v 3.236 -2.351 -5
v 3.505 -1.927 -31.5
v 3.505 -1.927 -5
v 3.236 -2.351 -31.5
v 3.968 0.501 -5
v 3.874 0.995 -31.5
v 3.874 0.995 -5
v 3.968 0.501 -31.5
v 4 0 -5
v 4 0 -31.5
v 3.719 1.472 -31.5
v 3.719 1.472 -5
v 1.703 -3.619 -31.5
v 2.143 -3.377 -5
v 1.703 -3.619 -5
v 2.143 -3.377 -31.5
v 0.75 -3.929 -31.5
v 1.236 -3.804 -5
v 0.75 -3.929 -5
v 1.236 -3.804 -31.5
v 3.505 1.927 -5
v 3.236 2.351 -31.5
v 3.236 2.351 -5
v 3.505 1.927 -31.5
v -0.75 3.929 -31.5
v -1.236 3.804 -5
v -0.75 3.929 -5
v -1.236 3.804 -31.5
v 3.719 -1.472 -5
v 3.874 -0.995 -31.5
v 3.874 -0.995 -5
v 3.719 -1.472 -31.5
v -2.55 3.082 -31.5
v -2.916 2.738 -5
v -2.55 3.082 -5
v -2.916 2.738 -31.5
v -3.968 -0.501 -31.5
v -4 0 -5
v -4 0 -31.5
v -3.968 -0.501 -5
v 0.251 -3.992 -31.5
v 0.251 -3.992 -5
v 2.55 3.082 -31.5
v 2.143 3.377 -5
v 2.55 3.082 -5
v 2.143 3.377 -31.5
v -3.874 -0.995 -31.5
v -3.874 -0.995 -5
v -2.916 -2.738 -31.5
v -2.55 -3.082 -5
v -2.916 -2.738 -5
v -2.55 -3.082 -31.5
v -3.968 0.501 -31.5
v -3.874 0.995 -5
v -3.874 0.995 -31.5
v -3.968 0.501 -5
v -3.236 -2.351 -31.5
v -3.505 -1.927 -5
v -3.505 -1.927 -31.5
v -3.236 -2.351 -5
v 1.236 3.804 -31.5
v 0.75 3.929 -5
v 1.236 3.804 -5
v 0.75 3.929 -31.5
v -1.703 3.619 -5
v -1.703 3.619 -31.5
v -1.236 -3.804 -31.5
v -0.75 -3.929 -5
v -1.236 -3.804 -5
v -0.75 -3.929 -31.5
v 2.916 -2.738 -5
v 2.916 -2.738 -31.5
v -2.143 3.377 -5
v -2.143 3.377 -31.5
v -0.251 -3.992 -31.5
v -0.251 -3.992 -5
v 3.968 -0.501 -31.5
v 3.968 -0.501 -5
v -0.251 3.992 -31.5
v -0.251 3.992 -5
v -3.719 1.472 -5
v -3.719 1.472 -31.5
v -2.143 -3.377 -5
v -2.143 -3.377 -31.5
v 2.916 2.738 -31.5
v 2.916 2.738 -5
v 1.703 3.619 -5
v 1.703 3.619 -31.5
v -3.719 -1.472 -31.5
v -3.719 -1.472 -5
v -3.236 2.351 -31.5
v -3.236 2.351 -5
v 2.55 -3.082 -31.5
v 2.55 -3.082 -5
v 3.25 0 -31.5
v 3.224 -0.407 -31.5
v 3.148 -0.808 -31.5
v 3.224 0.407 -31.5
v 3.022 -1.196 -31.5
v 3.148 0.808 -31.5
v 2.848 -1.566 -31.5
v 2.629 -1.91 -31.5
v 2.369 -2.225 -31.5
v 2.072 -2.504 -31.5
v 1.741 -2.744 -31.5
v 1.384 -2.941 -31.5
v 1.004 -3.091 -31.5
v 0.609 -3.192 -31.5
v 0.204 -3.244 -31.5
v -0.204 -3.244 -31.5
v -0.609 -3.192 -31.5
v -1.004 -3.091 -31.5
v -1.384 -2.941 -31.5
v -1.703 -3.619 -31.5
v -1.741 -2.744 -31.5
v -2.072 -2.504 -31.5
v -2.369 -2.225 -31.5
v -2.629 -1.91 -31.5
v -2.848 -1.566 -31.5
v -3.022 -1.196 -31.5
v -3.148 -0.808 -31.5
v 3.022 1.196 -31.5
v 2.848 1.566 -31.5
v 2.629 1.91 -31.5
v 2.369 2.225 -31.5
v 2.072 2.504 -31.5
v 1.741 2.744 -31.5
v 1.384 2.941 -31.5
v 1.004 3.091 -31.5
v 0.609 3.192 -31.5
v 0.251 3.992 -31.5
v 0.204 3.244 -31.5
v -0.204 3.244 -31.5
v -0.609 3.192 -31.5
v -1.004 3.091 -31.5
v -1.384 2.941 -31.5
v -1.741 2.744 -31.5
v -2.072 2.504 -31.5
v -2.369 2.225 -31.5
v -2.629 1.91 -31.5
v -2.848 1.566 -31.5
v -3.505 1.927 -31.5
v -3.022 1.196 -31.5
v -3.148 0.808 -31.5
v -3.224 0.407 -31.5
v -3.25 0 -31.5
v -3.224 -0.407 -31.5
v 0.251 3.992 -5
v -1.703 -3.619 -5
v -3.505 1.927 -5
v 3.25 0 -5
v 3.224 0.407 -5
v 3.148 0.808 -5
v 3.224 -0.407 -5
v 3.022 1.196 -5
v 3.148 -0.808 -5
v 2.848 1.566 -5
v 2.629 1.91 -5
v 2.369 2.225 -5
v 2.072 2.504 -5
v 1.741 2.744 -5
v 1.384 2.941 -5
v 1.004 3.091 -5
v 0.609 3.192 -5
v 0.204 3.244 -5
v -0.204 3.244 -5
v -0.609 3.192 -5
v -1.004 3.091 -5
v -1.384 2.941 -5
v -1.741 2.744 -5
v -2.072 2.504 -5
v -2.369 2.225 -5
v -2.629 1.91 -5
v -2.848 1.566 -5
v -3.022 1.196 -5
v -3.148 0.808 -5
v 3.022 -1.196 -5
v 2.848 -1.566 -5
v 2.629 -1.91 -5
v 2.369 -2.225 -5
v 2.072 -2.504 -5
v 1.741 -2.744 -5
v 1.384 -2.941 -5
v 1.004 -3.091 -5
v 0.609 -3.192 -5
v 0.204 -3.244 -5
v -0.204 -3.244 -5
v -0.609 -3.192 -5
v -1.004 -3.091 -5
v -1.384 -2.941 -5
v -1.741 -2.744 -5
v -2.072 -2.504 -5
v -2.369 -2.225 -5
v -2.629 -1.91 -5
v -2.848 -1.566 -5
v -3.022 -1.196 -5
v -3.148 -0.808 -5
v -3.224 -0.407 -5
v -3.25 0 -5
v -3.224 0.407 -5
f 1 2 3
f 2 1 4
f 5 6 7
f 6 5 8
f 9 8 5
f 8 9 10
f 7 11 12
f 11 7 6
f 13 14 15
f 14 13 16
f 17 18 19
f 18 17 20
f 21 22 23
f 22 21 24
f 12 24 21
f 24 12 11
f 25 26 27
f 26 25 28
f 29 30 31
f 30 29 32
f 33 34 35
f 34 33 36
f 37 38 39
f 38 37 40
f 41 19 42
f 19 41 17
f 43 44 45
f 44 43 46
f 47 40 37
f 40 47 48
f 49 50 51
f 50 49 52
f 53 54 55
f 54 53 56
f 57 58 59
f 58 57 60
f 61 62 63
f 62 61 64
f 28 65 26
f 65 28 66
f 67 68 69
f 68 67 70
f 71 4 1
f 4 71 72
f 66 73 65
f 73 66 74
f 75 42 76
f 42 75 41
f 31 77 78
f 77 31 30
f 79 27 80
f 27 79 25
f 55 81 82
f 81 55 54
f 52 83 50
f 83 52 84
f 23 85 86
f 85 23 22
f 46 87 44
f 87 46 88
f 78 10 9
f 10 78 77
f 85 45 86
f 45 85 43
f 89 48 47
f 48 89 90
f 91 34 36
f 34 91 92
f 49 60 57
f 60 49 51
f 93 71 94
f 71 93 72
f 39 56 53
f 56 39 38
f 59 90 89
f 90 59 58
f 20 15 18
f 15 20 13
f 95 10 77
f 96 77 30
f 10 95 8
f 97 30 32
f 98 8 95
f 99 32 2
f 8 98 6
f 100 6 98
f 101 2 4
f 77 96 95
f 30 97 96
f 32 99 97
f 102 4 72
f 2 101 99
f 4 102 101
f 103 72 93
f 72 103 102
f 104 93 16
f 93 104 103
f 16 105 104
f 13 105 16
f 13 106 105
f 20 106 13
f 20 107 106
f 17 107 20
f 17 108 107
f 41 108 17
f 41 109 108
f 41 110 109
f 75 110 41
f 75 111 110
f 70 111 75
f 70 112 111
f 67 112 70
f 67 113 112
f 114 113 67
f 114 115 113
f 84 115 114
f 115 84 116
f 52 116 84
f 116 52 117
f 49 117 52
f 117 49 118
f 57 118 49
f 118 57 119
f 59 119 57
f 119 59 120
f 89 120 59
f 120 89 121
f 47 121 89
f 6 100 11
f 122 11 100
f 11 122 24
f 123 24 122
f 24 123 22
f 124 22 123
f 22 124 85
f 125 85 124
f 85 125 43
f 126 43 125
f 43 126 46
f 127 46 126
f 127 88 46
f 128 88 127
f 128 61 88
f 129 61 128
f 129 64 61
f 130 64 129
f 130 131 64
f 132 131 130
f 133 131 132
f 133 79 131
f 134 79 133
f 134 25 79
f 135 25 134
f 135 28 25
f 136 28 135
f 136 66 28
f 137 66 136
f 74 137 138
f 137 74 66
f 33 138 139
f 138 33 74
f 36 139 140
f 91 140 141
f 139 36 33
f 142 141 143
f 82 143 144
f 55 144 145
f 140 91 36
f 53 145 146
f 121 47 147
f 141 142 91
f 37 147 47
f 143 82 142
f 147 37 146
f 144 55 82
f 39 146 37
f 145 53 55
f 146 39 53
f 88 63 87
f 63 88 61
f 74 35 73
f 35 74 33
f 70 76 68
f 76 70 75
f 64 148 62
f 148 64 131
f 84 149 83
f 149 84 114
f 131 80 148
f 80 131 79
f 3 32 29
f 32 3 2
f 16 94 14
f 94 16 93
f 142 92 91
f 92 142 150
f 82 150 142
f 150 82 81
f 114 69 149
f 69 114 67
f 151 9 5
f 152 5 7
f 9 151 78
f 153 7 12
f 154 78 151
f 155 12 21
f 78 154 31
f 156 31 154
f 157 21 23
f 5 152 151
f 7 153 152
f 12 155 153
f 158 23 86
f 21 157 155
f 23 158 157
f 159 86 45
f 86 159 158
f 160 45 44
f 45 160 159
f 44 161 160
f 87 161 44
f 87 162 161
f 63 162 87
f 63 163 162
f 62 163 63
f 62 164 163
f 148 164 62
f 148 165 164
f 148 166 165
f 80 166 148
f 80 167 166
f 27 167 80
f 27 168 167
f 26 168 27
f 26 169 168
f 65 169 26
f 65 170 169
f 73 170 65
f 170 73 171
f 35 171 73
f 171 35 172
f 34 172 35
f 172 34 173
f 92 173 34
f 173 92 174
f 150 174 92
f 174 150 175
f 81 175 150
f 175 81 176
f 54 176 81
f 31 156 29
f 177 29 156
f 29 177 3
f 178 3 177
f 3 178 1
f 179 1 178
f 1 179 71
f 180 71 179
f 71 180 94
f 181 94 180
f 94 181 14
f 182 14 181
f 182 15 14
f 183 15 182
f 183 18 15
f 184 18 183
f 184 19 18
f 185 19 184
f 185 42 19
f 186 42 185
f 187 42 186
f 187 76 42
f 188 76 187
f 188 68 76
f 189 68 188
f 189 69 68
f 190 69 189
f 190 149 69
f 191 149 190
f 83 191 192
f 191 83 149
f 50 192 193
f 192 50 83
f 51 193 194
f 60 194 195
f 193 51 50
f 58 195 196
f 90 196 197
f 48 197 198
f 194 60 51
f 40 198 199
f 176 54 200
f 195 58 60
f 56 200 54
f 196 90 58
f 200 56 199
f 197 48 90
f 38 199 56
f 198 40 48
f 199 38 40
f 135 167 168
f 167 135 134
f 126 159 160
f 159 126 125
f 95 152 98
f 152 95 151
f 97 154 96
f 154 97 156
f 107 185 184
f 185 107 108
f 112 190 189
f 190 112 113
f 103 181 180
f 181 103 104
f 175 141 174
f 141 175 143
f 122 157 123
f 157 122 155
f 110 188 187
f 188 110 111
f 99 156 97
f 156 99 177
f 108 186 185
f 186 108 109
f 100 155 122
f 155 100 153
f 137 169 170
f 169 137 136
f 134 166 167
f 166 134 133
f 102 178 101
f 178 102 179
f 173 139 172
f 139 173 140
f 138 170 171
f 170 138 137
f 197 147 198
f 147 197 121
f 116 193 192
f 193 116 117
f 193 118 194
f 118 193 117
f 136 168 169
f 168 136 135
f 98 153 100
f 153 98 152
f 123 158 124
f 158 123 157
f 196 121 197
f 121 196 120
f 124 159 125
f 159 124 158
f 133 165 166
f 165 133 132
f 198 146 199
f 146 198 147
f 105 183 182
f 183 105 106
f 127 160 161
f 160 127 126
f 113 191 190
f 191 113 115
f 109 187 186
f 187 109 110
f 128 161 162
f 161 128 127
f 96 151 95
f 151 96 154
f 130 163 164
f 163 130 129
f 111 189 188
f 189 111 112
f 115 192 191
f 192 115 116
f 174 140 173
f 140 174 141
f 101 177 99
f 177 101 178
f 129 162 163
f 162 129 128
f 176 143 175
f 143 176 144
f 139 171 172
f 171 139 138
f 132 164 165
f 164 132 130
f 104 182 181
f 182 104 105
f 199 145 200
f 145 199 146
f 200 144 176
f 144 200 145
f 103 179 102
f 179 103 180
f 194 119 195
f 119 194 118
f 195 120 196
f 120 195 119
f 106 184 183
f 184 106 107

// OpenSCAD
$fn = 50;

difference() {
	union() {
		translate(v = [0, 0, -31.5]) {
			cylinder(h = 31.5, r = 4.0);
		}
		#translate(v = [0, 0, -33.0]) {
			cylinder(h = 33, r = 2.875);
		}
	}
	union() {
		translate(v = [0, 0, 0]) {
			rotate(a = [0, 0, 0]) {
				difference() {
					union() {
						translate(v = [0, 0, -5]) {
							linear_extrude(height = 5) {
								polygon(points = [[5.914249999999999, 0.0], [2.957125, 5.1218907443321156], [-2.9571249999999982, 5.1218907443321156], [-5.914249999999999, 7.242867331857232e-16], [-2.9571250000000022, -5.121890744332115], [2.9571249999999956, -5.121890744332118]]);
							}
						}
					}
					union();
				}
			}
		}
		#translate(v = [0, 0, -100.0]) {
			cylinder(h = 200, r = 3.25);
		}
	}
}
